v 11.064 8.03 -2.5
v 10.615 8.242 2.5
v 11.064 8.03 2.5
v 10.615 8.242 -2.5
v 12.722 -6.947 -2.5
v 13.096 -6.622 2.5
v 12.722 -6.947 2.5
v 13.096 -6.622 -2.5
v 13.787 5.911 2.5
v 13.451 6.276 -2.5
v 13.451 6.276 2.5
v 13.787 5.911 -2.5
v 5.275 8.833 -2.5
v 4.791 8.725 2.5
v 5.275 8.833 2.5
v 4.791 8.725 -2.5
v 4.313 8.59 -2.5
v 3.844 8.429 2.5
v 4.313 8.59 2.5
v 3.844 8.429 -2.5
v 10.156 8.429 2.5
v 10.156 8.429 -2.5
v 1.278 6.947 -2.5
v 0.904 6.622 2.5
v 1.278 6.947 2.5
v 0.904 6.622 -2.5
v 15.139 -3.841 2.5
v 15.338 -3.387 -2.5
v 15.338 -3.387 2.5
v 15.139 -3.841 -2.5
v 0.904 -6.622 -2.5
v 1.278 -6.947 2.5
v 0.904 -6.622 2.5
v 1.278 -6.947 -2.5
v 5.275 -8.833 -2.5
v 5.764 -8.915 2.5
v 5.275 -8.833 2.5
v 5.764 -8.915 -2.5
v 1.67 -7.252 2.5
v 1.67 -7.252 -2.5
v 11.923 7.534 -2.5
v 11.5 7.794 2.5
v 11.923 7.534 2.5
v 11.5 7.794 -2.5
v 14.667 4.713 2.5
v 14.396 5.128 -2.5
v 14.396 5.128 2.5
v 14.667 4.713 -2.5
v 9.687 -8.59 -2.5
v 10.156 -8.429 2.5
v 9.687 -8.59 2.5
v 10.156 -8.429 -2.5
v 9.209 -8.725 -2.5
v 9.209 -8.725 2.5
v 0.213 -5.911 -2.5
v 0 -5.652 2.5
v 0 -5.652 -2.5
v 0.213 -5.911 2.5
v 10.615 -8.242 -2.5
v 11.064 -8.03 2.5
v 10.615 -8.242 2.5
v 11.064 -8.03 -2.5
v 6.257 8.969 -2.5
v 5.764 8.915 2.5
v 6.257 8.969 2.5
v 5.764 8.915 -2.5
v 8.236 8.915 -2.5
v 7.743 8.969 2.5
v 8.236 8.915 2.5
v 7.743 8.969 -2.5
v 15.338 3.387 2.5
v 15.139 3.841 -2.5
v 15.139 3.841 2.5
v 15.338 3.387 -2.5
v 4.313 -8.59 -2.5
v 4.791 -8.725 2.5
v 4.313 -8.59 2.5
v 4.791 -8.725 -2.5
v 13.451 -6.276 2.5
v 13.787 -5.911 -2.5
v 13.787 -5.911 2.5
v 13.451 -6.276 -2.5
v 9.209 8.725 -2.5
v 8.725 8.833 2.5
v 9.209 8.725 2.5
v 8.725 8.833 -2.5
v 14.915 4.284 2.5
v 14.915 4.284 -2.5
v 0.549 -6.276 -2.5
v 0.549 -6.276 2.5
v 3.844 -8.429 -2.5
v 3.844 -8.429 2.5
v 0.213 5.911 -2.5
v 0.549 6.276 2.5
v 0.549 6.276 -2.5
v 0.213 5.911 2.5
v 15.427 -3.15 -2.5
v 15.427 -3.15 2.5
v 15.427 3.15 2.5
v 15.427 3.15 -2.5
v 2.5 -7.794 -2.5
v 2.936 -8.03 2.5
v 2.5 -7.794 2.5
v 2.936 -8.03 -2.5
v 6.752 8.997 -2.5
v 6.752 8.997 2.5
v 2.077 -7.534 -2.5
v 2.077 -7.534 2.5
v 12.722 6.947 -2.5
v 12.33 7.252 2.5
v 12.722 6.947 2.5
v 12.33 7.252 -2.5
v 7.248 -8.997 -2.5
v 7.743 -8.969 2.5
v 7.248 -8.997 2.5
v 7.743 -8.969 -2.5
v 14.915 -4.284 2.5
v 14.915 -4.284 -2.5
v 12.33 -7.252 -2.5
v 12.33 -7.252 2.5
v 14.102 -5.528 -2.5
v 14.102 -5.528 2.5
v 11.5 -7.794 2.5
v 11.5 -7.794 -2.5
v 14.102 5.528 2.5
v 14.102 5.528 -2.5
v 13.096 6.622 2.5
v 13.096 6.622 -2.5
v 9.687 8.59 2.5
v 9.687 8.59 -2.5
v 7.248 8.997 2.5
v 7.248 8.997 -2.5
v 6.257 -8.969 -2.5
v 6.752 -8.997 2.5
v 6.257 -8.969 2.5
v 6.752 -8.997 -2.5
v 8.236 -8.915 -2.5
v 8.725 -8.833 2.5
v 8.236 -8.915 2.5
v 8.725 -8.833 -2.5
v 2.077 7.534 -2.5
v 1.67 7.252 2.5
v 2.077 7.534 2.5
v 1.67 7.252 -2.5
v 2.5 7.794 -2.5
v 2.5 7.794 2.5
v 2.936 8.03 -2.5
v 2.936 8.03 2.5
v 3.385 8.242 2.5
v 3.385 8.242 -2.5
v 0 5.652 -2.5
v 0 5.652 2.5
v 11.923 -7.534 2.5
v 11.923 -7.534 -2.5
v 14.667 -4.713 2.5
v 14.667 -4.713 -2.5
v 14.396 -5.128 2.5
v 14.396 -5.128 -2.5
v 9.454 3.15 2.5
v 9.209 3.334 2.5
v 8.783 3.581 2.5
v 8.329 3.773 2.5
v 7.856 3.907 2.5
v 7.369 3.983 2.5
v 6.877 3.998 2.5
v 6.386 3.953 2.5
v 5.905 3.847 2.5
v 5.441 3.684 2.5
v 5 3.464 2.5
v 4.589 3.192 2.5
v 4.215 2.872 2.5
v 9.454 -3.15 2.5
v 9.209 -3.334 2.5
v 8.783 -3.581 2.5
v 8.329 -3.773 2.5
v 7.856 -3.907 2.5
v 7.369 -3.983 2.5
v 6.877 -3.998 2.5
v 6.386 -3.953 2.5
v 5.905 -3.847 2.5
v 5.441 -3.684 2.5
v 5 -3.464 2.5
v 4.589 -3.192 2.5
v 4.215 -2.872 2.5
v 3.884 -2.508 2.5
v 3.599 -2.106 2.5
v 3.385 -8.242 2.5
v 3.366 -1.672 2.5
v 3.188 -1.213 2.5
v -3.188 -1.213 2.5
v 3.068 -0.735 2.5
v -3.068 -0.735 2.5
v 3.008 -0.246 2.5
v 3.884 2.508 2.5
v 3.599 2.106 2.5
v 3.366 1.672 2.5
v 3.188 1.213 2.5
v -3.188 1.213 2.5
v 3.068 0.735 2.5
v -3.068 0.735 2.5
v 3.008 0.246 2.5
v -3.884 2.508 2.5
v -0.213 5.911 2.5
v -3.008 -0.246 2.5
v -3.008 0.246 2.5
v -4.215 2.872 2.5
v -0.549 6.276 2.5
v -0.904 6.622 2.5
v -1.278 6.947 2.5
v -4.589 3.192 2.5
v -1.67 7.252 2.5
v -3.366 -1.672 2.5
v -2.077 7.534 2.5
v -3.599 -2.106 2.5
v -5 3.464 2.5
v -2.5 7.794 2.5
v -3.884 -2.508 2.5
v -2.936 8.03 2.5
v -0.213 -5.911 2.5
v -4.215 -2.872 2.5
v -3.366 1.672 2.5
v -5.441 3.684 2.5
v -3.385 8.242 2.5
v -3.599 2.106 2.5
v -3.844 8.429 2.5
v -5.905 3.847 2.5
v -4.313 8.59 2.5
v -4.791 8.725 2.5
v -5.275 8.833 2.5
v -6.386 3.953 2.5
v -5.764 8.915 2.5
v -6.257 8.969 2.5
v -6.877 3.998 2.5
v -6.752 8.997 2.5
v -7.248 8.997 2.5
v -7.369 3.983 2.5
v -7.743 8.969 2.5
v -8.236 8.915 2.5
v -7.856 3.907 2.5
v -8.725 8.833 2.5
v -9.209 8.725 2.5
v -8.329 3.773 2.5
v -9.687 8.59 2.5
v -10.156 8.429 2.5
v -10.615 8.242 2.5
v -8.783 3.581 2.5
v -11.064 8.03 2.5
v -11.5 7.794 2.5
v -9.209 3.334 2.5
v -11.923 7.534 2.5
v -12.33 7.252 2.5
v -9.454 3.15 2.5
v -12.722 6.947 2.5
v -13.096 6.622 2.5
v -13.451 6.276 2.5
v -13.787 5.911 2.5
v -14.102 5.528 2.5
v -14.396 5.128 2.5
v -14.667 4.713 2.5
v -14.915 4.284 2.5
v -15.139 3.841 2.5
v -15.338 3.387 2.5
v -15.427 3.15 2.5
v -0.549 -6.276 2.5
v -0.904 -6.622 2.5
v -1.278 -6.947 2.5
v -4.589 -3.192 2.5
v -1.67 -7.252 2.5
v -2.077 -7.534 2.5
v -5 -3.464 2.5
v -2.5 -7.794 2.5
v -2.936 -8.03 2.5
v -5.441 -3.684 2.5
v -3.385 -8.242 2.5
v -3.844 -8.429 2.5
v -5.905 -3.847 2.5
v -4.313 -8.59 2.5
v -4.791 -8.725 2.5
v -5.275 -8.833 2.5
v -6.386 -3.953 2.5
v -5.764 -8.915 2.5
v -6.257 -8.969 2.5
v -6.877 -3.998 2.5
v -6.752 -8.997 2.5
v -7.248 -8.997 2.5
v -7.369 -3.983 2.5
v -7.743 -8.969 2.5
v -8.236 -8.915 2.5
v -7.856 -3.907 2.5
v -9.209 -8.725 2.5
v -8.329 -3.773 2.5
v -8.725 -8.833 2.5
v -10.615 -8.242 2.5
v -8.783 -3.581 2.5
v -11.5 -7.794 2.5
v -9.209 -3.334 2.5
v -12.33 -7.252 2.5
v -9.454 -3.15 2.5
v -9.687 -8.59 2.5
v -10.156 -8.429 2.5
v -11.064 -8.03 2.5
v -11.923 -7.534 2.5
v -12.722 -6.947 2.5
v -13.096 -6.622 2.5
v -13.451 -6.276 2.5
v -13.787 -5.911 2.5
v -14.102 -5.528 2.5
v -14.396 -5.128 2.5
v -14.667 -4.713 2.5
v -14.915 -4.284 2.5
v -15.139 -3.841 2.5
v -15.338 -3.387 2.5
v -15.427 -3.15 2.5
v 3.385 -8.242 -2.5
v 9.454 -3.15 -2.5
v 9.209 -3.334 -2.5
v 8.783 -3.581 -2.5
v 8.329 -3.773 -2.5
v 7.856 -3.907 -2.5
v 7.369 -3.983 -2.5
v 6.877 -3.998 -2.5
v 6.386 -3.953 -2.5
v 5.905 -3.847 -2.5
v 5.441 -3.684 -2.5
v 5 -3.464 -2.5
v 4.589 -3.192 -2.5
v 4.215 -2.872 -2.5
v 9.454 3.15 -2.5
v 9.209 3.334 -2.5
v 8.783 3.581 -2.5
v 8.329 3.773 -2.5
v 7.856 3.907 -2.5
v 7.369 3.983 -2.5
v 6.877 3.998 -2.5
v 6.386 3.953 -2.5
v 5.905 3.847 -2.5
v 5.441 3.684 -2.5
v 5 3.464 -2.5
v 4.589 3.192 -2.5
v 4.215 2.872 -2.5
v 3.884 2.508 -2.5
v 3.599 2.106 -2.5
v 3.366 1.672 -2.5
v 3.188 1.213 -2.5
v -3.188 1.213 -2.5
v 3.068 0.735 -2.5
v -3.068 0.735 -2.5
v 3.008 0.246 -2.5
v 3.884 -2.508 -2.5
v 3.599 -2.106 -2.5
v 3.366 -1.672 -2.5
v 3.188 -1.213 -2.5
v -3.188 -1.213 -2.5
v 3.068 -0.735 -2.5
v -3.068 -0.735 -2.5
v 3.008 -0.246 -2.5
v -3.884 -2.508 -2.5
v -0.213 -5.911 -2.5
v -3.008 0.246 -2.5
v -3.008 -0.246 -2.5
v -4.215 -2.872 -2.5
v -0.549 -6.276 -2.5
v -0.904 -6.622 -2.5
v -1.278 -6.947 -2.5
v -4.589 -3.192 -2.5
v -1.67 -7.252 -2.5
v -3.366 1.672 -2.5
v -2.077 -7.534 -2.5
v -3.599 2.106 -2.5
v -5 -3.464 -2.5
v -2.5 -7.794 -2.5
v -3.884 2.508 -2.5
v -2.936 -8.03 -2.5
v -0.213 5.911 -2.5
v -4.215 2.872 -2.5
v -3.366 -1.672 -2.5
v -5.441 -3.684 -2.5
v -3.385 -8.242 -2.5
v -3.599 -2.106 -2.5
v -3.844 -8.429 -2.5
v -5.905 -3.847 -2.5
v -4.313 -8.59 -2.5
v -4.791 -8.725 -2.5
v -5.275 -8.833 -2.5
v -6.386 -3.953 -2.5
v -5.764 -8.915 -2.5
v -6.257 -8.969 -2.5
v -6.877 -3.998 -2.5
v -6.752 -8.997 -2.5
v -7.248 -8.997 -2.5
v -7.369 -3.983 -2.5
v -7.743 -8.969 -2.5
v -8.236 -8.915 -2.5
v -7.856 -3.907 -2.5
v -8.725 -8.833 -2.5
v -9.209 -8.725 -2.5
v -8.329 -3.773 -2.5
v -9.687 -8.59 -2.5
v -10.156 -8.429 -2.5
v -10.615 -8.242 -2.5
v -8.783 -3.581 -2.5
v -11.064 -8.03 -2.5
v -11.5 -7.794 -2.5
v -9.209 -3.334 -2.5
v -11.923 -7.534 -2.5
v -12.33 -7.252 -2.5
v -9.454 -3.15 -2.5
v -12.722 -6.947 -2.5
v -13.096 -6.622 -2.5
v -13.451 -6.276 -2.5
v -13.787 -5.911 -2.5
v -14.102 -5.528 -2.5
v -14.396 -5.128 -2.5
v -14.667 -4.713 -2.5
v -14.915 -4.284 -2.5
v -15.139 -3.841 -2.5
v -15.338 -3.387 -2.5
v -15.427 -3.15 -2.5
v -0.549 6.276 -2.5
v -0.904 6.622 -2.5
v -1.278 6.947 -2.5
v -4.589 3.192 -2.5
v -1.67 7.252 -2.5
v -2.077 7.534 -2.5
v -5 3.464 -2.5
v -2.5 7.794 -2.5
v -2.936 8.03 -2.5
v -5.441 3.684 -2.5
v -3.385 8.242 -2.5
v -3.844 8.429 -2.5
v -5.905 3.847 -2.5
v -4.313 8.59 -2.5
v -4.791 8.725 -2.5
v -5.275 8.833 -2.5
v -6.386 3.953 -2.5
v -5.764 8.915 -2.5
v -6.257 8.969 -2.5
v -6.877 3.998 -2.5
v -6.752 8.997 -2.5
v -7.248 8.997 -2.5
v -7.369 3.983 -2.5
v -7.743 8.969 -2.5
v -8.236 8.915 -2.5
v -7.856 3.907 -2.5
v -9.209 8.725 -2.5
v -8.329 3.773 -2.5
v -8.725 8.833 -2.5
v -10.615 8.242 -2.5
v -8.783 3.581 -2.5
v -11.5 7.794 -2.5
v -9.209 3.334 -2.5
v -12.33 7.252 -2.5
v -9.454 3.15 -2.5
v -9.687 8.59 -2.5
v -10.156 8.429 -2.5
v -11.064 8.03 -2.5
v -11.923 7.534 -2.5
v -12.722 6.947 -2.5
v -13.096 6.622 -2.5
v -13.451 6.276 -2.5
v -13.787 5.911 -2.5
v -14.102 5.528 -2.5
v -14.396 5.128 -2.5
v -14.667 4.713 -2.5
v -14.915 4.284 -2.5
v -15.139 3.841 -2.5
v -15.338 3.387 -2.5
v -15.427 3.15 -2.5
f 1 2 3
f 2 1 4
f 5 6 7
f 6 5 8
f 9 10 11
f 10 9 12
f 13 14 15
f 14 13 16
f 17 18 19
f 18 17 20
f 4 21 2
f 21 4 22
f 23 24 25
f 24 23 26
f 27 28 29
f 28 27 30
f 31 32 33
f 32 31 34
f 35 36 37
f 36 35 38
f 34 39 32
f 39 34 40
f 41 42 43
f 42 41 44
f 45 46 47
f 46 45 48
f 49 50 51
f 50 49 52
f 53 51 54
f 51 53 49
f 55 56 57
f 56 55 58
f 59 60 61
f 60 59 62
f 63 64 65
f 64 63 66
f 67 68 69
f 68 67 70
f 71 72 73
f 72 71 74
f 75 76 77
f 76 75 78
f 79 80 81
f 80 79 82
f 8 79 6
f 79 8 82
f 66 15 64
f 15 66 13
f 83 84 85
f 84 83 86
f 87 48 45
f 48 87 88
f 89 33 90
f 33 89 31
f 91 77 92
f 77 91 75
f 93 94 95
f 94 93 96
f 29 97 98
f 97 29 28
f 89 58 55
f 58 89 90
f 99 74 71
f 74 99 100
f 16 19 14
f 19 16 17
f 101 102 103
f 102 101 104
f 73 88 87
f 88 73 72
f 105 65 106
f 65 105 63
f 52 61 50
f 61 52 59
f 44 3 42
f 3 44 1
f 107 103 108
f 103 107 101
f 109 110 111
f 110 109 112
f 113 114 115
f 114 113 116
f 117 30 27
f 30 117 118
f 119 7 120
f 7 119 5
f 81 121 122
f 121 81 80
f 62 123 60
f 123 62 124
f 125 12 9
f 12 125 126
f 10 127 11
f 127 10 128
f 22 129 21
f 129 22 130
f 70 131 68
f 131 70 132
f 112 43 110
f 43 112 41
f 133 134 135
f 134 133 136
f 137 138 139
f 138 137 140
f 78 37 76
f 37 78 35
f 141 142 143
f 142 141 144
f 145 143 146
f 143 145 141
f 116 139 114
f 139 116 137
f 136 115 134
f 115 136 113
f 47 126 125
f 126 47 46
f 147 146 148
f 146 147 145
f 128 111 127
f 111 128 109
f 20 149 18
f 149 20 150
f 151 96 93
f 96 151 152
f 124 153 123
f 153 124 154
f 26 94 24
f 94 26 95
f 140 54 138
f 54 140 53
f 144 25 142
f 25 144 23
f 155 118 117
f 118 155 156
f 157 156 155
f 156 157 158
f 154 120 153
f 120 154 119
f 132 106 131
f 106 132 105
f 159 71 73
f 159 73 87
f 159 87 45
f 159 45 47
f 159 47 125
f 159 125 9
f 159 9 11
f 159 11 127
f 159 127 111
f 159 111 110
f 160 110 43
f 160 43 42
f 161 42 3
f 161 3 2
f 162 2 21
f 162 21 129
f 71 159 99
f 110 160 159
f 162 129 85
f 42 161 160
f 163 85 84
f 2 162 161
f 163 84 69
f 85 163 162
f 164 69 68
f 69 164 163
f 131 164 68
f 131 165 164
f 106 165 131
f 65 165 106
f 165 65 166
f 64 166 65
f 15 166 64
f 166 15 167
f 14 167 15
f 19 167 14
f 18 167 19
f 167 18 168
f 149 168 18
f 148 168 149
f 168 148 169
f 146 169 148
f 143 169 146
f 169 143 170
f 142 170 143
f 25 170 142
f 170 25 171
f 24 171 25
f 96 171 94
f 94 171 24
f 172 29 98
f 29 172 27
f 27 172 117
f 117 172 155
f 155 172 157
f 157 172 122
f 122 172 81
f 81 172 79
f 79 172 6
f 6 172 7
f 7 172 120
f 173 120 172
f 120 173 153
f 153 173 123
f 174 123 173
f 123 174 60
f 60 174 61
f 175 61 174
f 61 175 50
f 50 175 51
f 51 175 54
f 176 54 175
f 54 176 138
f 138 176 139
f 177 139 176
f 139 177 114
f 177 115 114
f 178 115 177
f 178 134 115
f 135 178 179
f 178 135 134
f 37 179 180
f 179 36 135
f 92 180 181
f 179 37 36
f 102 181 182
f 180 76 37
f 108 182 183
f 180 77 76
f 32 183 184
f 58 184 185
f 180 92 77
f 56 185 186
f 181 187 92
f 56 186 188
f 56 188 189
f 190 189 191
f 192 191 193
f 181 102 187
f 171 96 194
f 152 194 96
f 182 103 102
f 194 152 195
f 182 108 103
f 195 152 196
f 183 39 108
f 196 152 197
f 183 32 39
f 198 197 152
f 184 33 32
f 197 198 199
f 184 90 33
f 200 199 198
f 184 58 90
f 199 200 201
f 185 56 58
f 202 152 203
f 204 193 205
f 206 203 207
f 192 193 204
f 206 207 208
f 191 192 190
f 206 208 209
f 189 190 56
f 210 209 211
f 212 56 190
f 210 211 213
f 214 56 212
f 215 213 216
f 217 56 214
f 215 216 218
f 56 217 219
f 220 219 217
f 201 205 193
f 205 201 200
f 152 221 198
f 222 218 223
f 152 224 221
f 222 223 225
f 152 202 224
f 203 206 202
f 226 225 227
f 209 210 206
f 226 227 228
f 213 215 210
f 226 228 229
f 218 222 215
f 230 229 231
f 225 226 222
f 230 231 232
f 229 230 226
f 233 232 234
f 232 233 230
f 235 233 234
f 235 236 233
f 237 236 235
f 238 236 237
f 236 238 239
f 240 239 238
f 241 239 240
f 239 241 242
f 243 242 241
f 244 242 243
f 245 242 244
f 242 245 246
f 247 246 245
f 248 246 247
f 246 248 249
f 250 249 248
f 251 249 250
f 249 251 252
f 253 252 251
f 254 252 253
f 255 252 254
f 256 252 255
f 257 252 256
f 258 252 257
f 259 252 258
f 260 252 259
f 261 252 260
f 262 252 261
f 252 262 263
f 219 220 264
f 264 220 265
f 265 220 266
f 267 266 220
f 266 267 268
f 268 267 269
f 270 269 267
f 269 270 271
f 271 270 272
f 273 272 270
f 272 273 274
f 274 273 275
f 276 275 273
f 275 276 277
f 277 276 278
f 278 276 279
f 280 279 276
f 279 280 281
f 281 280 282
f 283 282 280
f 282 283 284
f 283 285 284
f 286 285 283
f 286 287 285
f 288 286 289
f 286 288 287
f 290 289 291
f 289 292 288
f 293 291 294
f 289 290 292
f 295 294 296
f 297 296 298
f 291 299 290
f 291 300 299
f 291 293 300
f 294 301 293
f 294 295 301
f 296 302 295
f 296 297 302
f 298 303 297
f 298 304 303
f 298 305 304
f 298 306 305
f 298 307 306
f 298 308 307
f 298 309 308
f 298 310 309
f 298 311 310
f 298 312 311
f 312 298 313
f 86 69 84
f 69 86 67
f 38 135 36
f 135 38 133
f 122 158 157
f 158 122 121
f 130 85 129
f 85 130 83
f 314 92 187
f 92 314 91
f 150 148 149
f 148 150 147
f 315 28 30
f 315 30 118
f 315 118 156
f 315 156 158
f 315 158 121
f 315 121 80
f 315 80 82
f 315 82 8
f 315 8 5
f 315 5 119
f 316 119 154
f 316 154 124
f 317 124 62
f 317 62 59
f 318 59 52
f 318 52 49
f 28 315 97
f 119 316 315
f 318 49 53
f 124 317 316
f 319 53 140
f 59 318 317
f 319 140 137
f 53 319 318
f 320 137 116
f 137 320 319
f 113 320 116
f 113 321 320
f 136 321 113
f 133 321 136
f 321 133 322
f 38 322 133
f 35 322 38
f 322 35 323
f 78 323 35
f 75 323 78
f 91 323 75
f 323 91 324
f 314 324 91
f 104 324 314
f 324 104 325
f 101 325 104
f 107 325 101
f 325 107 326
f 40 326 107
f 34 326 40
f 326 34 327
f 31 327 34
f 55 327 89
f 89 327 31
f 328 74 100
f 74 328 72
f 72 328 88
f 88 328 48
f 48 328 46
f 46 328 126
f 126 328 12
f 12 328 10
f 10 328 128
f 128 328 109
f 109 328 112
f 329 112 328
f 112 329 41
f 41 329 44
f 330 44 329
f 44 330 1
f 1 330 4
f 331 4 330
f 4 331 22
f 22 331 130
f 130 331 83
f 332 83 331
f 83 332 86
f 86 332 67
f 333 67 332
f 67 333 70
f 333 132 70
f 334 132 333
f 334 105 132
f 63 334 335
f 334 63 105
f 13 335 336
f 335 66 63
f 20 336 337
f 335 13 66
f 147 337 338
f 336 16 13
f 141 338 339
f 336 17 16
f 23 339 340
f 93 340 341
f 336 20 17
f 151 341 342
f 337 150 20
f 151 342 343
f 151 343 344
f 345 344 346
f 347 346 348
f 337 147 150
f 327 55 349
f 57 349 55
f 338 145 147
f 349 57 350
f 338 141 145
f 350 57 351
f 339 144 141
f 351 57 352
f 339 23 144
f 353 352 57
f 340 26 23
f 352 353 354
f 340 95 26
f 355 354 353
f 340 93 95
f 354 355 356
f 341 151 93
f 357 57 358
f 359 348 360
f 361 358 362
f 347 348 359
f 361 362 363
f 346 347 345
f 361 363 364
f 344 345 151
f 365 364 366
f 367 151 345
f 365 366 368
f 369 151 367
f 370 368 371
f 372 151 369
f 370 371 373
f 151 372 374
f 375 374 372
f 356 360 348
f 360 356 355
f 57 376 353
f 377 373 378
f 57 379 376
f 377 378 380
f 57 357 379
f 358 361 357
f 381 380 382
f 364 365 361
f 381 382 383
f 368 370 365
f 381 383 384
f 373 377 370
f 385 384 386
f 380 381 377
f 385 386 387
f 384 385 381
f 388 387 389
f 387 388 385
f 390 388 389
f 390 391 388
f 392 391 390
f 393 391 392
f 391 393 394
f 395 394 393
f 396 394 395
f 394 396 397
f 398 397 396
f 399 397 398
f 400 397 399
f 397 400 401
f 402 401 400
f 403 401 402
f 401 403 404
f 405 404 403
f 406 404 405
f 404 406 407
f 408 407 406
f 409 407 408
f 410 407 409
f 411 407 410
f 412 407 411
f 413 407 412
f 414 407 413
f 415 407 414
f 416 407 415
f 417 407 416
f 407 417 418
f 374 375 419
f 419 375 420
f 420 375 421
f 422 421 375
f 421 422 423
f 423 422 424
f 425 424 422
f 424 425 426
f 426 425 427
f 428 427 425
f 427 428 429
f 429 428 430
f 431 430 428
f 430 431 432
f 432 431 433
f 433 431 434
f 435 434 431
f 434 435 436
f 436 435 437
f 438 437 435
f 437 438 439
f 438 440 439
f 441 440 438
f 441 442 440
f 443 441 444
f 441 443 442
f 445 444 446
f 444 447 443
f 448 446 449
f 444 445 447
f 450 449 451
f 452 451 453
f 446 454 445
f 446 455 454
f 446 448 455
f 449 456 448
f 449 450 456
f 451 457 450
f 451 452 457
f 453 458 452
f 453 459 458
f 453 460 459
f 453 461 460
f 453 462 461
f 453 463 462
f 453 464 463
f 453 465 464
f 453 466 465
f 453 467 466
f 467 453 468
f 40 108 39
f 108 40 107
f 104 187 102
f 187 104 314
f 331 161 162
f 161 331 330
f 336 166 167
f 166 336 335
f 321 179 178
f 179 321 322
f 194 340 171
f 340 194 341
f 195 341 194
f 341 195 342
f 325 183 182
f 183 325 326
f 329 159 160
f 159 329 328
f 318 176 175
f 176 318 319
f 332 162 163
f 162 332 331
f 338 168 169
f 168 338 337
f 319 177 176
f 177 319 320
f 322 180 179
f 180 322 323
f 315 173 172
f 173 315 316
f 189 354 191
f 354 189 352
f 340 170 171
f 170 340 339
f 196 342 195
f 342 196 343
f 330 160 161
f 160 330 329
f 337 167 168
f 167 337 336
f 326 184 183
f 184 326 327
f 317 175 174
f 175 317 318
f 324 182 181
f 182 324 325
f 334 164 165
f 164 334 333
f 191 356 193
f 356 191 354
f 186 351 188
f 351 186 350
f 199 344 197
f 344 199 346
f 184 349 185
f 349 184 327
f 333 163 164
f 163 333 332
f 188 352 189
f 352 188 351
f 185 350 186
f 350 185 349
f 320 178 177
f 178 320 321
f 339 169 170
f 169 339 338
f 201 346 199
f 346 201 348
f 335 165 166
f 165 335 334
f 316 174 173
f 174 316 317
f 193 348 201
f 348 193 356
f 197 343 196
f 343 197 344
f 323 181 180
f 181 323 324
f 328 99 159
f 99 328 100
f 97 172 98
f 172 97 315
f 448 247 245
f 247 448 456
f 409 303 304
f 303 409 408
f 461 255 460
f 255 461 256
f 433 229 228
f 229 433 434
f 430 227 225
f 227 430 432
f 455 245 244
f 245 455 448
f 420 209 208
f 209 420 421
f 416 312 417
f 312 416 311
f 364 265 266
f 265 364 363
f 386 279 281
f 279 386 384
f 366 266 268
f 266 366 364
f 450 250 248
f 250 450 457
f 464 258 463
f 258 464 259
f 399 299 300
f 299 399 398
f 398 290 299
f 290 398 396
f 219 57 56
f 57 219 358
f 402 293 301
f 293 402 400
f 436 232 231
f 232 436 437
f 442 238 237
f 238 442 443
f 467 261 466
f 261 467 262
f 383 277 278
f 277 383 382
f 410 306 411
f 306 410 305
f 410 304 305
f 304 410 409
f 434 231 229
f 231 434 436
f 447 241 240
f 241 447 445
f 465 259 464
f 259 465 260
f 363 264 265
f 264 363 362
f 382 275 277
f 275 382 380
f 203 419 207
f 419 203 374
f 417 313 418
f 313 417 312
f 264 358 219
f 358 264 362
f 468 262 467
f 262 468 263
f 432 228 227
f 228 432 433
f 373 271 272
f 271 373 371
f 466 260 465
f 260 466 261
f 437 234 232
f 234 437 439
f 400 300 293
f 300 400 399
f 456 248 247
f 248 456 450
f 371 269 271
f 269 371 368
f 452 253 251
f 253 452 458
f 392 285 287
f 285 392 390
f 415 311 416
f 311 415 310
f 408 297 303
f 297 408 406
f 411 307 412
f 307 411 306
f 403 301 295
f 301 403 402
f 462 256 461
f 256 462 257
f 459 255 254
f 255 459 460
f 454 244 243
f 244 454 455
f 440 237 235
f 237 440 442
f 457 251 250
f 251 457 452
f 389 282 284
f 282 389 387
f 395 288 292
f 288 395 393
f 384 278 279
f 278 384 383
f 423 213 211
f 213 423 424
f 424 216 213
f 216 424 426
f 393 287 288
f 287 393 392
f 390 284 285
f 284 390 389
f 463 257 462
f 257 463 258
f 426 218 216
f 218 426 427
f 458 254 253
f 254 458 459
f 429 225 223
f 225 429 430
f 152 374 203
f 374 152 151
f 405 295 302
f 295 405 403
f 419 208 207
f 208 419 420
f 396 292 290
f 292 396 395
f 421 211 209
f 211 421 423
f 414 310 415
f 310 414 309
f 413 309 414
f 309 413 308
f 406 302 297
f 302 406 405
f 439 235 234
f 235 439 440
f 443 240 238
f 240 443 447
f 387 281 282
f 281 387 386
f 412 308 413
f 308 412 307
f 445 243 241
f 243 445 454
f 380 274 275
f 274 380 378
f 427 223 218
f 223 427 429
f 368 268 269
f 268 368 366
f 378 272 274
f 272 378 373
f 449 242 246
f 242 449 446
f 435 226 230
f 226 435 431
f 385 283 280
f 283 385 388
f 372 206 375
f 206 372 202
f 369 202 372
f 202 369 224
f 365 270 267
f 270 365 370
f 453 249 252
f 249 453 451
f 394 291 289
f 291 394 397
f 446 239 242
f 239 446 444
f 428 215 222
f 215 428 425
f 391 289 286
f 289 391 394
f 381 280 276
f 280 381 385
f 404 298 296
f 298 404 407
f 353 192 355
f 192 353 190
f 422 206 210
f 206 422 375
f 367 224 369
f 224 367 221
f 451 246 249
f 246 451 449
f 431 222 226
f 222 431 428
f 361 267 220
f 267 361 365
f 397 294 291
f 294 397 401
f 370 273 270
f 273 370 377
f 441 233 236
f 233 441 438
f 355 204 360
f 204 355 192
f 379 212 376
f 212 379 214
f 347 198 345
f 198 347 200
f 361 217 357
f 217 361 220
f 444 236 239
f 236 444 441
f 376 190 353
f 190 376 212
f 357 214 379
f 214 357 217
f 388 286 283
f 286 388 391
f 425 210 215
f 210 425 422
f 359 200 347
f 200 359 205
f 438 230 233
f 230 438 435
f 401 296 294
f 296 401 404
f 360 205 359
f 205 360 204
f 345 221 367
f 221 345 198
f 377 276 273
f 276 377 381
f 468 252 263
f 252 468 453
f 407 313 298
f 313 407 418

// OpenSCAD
$fa=1;
$fs=0.5;

// Connect two male ends of Duplo trains

height=5; // height of the part
d1 = 18; // original outer diameter from Duplo
d2 = d1-3;    // shrinked for better movement
inner_dia = 6.3; // Inner diameter


// part1();
// part2();
// connector_blocking();
connector_normal();

module default_part() {
    difference () {
	cylinder (d=d1, height, center=true);
	cylinder (d=8, h=height+2, center=true);
	translate ([5,0,0])
	cube ([10,inner_dia,6], center=true);
    }    
}

module part1 () {
    y = (d1-inner_dia)/2;
    x = 8.5;
    // This part is constructed so that it won't move on the train.
    difference () {
	union () {
	    cylinder (d=d1, height, center=true);
	    translate ([x/2,y,0])
	    cube ([x,y,height], center=true);
	    translate ([x/2,-y,0])
	    cube ([x,y,height], center=true);
	    }
	cylinder (d=8, h=height+2, center=true);
	translate ([5,0,0])
	cube ([10,inner_dia,6], center=true);
    }
}

module part2() {
    y = (18-inner_dia)/2;
    x = 3;
    // This part should move easily on the train
    difference () {
	cylinder (d=d2, height, center=true);
	cylinder (d=8, h=height+2, center=true);
	translate ([5,0,0])
	cube ([10,inner_dia,6], center=true);
    }
}

module connector_blocking () {
    translate ([7,0,0])
    part1();
    translate ([-7,0,0])
    mirror ([1,0,0])
    part2();
}

module connector_normal(){
    translate ([7,0,0])
    default_part();
    translate ([-7,0,0])
    mirror ([1,0,0])
    default_part();
    }
